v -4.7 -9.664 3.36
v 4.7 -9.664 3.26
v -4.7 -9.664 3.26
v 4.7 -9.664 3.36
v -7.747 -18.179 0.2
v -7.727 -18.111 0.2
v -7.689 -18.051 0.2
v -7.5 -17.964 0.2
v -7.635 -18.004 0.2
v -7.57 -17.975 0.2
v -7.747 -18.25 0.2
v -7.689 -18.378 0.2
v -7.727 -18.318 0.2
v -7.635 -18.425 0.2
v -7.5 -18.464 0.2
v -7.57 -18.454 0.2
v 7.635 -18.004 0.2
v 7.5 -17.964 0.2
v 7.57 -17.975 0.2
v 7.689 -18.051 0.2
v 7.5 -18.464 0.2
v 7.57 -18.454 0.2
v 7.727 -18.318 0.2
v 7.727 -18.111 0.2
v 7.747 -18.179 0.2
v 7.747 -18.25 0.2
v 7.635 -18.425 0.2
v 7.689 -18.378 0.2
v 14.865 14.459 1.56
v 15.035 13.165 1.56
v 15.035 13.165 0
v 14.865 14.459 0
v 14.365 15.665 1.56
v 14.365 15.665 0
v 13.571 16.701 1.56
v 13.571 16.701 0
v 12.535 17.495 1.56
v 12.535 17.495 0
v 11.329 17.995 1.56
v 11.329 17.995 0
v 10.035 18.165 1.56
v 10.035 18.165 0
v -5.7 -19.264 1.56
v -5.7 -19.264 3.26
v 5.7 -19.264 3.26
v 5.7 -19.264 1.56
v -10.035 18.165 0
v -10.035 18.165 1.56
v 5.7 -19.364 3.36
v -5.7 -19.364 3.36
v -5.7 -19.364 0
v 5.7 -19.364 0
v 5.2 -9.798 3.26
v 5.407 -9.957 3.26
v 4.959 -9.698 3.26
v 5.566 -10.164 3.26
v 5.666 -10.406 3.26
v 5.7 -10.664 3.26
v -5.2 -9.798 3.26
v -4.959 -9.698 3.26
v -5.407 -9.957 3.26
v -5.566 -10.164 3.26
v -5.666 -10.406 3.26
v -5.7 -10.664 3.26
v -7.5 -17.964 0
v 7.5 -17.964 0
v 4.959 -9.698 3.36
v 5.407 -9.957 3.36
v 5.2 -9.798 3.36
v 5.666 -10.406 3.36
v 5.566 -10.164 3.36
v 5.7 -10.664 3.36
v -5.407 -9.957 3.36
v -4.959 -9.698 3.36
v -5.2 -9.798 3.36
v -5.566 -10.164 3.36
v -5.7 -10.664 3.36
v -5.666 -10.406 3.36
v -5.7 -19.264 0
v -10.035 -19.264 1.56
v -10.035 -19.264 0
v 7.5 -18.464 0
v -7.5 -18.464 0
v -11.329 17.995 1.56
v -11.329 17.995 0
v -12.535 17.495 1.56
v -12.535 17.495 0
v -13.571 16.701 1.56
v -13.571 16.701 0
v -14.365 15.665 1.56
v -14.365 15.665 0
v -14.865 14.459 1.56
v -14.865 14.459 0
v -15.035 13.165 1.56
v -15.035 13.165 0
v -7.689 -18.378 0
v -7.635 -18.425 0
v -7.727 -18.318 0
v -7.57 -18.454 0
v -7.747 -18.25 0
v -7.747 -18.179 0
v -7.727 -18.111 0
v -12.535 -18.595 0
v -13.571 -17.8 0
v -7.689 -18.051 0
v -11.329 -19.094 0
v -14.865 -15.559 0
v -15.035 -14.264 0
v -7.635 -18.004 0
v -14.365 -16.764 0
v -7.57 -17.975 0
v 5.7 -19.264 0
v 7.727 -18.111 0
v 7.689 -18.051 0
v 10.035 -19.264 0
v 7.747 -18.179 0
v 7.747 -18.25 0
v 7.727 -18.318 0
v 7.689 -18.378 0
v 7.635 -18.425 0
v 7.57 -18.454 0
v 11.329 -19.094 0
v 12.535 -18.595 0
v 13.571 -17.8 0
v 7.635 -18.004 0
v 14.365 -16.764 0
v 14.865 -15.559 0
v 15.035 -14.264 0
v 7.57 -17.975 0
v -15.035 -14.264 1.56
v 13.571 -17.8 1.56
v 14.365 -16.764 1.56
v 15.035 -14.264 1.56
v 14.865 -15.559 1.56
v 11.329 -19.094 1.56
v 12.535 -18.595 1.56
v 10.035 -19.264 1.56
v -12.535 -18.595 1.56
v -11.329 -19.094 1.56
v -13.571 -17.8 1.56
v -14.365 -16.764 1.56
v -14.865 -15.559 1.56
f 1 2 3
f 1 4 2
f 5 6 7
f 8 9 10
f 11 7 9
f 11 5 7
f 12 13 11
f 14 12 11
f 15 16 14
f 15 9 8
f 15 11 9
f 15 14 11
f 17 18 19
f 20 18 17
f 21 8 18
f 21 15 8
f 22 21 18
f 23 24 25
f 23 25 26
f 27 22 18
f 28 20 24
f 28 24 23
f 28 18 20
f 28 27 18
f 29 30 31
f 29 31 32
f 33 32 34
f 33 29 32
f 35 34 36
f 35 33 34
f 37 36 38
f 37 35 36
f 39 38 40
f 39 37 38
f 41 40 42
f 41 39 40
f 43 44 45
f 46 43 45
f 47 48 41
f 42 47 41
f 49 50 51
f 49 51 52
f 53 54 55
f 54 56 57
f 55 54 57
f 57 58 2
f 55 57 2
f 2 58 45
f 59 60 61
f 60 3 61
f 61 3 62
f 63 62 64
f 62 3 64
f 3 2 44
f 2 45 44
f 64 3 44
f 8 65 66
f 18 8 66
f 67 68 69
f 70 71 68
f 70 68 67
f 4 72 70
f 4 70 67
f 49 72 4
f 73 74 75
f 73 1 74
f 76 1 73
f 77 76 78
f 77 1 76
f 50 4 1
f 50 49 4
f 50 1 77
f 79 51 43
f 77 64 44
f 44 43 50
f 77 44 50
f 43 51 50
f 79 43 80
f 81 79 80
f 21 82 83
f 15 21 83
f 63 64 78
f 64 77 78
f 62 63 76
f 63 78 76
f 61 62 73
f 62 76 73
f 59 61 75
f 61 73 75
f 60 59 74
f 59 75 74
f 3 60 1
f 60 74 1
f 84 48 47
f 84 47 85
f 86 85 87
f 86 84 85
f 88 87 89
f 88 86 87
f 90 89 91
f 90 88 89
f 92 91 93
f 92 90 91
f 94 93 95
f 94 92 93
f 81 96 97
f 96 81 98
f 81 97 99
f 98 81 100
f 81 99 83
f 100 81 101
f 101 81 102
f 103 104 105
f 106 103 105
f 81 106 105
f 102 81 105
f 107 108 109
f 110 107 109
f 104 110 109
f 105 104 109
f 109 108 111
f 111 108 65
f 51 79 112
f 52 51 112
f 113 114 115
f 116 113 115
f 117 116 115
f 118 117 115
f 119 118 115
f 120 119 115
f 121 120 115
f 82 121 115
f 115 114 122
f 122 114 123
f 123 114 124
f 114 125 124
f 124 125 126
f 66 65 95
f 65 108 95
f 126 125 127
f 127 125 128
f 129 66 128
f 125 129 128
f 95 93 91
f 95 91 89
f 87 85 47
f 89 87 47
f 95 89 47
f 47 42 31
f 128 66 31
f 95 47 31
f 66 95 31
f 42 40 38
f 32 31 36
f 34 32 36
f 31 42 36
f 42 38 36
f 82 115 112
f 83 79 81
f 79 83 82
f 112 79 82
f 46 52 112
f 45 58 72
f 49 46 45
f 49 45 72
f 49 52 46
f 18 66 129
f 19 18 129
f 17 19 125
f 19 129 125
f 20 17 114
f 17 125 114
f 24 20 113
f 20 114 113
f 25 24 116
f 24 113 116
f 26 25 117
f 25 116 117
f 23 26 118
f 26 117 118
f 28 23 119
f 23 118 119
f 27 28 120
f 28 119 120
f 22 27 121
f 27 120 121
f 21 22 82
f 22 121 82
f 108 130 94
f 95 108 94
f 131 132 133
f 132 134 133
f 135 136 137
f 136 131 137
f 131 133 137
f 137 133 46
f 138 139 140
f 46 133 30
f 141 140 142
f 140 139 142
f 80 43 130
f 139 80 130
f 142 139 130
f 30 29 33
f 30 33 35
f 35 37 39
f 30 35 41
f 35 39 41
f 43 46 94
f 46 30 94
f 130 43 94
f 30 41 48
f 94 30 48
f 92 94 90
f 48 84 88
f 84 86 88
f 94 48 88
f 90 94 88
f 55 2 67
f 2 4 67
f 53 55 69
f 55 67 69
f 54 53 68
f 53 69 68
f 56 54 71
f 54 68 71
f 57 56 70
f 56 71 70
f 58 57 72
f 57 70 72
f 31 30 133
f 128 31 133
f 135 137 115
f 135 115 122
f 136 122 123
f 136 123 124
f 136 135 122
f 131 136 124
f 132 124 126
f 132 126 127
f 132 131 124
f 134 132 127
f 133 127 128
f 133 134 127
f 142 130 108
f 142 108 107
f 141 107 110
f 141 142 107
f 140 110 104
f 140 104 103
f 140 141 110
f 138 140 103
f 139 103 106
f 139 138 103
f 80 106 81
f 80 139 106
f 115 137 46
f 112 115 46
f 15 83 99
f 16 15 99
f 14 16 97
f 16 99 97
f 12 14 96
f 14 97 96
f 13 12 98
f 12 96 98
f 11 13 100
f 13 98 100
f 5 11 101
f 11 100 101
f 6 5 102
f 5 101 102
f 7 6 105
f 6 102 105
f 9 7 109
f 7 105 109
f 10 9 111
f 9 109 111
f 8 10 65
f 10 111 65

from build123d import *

# Parameters (mm, degrees)
PAD_DEPTH    = 1.56
PAD001_DEPTH = 1.56
SKETCH002_W  = 11.4
SKETCH002_H  = 3.36
PAD002_DEPTH = 0.1
SKETCH003_W  = 11.4
SKETCH003_H  = 0.1
PAD003_DEPTH = 9.6
FILLET_R     = 1
FILLET001_R  = 1
POCKET_DEPTH = 0.2


with BuildPart() as part:
    # Sketch → Pad (new body)
    with BuildSketch(Plane.XY):
        with BuildLine():
            Line((-9.985, 17.165), (9.985, 17.165))
            ThreePointArc((13.985, 13.165), (12.813427, 15.993427), (9.985, 17.165))
            Line((13.985, 13.165), (13.985, -13.165))
            ThreePointArc((9.985, -17.165), (12.813427, -15.993427), (13.985, -13.165))
            Line((9.985, -17.165), (-9.985, -17.165))
            ThreePointArc((-13.985, -13.165), (-12.813427, -15.993427), (-9.985, -17.165))
            Line((-13.985, -13.165), (-13.985, 13.165))
            ThreePointArc((-9.985, 17.165), (-12.813427, 15.993427), (-13.985, 13.165))
        make_face()
    extrude(amount=PAD_DEPTH)

    # Sketch001 (on Face10 of Pad) → Pad001 (join)
    with BuildSketch(Plane.XY.offset(1.56)):
        with BuildLine():
            Line((-10.035, 18.165), (10.035, 18.165))
            ThreePointArc((15.035, 13.165), (13.570534, 16.700534), (10.035, 18.165))
            Line((15.035, 13.165), (15.035, -14.264405))
            ThreePointArc((10.035, -19.264405), (13.570534, -17.799939), (15.035, -14.264405))
            Line((10.035, -19.264405), (-10.035, -19.264405))
            ThreePointArc((-15.035, -14.264405), (-13.570534, -17.799939), (-10.035, -19.264405))
            Line((-15.035, -14.264405), (-15.035, 13.165))
            ThreePointArc((-10.035, 18.165), (-13.570534, 16.700534), (-15.035, 13.165))
        make_face()
    extrude(amount=-PAD001_DEPTH)

    # Sketch002 (on Face10 of Pad001) → Pad002 (join)
    with BuildSketch(Plane.XZ.offset(19.264405)):
        with Locations((0, 1.68)):
            Rectangle(SKETCH002_W, SKETCH002_H)
    extrude(amount=PAD002_DEPTH)

    # Sketch003 (on Face11 of Pad002) → Pad003 (join)
    with BuildSketch(Plane(origin=(0, -19.264405, 0), x_dir=(-1, 0, 0), z_dir=(0, 1, 0))):
        with Locations((0, 3.31)):
            Rectangle(SKETCH003_W, SKETCH003_H)
    extrude(amount=PAD003_DEPTH)

    # Fillet
    fillet_edges = [part.edges().sort_by_distance(p)[0] for p in [
        (-5.7, -9.664405, 3.31),
    ]]
    fillet(fillet_edges, radius=FILLET_R)

    # Fillet001
    fillet001_edges = [part.edges().sort_by_distance(p)[0] for p in [
        (5.7, -9.664405, 3.31),
    ]]
    fillet(fillet001_edges, radius=FILLET001_R)

    # Sketch004 (on Face25 of Fillet001) → Pocket (cut)
    with BuildSketch(Plane(origin=(0, 0, 0), x_dir=(1, 0, 0), z_dir=(0, 0, -1))):
        with BuildLine():
            ThreePointArc((-7.5, 18.464405), (-7.75, 18.214405), (-7.5, 17.964405))
            Line((-7.5, 17.964405), (7.5, 17.964405))
            ThreePointArc((7.5, 17.964405), (7.75, 18.214405), (7.5, 18.464405))
            Line((7.5, 18.464405), (-7.5, 18.464405))
        make_face()
    extrude(amount=-POCKET_DEPTH, mode=Mode.SUBTRACT)


solid = part.part
